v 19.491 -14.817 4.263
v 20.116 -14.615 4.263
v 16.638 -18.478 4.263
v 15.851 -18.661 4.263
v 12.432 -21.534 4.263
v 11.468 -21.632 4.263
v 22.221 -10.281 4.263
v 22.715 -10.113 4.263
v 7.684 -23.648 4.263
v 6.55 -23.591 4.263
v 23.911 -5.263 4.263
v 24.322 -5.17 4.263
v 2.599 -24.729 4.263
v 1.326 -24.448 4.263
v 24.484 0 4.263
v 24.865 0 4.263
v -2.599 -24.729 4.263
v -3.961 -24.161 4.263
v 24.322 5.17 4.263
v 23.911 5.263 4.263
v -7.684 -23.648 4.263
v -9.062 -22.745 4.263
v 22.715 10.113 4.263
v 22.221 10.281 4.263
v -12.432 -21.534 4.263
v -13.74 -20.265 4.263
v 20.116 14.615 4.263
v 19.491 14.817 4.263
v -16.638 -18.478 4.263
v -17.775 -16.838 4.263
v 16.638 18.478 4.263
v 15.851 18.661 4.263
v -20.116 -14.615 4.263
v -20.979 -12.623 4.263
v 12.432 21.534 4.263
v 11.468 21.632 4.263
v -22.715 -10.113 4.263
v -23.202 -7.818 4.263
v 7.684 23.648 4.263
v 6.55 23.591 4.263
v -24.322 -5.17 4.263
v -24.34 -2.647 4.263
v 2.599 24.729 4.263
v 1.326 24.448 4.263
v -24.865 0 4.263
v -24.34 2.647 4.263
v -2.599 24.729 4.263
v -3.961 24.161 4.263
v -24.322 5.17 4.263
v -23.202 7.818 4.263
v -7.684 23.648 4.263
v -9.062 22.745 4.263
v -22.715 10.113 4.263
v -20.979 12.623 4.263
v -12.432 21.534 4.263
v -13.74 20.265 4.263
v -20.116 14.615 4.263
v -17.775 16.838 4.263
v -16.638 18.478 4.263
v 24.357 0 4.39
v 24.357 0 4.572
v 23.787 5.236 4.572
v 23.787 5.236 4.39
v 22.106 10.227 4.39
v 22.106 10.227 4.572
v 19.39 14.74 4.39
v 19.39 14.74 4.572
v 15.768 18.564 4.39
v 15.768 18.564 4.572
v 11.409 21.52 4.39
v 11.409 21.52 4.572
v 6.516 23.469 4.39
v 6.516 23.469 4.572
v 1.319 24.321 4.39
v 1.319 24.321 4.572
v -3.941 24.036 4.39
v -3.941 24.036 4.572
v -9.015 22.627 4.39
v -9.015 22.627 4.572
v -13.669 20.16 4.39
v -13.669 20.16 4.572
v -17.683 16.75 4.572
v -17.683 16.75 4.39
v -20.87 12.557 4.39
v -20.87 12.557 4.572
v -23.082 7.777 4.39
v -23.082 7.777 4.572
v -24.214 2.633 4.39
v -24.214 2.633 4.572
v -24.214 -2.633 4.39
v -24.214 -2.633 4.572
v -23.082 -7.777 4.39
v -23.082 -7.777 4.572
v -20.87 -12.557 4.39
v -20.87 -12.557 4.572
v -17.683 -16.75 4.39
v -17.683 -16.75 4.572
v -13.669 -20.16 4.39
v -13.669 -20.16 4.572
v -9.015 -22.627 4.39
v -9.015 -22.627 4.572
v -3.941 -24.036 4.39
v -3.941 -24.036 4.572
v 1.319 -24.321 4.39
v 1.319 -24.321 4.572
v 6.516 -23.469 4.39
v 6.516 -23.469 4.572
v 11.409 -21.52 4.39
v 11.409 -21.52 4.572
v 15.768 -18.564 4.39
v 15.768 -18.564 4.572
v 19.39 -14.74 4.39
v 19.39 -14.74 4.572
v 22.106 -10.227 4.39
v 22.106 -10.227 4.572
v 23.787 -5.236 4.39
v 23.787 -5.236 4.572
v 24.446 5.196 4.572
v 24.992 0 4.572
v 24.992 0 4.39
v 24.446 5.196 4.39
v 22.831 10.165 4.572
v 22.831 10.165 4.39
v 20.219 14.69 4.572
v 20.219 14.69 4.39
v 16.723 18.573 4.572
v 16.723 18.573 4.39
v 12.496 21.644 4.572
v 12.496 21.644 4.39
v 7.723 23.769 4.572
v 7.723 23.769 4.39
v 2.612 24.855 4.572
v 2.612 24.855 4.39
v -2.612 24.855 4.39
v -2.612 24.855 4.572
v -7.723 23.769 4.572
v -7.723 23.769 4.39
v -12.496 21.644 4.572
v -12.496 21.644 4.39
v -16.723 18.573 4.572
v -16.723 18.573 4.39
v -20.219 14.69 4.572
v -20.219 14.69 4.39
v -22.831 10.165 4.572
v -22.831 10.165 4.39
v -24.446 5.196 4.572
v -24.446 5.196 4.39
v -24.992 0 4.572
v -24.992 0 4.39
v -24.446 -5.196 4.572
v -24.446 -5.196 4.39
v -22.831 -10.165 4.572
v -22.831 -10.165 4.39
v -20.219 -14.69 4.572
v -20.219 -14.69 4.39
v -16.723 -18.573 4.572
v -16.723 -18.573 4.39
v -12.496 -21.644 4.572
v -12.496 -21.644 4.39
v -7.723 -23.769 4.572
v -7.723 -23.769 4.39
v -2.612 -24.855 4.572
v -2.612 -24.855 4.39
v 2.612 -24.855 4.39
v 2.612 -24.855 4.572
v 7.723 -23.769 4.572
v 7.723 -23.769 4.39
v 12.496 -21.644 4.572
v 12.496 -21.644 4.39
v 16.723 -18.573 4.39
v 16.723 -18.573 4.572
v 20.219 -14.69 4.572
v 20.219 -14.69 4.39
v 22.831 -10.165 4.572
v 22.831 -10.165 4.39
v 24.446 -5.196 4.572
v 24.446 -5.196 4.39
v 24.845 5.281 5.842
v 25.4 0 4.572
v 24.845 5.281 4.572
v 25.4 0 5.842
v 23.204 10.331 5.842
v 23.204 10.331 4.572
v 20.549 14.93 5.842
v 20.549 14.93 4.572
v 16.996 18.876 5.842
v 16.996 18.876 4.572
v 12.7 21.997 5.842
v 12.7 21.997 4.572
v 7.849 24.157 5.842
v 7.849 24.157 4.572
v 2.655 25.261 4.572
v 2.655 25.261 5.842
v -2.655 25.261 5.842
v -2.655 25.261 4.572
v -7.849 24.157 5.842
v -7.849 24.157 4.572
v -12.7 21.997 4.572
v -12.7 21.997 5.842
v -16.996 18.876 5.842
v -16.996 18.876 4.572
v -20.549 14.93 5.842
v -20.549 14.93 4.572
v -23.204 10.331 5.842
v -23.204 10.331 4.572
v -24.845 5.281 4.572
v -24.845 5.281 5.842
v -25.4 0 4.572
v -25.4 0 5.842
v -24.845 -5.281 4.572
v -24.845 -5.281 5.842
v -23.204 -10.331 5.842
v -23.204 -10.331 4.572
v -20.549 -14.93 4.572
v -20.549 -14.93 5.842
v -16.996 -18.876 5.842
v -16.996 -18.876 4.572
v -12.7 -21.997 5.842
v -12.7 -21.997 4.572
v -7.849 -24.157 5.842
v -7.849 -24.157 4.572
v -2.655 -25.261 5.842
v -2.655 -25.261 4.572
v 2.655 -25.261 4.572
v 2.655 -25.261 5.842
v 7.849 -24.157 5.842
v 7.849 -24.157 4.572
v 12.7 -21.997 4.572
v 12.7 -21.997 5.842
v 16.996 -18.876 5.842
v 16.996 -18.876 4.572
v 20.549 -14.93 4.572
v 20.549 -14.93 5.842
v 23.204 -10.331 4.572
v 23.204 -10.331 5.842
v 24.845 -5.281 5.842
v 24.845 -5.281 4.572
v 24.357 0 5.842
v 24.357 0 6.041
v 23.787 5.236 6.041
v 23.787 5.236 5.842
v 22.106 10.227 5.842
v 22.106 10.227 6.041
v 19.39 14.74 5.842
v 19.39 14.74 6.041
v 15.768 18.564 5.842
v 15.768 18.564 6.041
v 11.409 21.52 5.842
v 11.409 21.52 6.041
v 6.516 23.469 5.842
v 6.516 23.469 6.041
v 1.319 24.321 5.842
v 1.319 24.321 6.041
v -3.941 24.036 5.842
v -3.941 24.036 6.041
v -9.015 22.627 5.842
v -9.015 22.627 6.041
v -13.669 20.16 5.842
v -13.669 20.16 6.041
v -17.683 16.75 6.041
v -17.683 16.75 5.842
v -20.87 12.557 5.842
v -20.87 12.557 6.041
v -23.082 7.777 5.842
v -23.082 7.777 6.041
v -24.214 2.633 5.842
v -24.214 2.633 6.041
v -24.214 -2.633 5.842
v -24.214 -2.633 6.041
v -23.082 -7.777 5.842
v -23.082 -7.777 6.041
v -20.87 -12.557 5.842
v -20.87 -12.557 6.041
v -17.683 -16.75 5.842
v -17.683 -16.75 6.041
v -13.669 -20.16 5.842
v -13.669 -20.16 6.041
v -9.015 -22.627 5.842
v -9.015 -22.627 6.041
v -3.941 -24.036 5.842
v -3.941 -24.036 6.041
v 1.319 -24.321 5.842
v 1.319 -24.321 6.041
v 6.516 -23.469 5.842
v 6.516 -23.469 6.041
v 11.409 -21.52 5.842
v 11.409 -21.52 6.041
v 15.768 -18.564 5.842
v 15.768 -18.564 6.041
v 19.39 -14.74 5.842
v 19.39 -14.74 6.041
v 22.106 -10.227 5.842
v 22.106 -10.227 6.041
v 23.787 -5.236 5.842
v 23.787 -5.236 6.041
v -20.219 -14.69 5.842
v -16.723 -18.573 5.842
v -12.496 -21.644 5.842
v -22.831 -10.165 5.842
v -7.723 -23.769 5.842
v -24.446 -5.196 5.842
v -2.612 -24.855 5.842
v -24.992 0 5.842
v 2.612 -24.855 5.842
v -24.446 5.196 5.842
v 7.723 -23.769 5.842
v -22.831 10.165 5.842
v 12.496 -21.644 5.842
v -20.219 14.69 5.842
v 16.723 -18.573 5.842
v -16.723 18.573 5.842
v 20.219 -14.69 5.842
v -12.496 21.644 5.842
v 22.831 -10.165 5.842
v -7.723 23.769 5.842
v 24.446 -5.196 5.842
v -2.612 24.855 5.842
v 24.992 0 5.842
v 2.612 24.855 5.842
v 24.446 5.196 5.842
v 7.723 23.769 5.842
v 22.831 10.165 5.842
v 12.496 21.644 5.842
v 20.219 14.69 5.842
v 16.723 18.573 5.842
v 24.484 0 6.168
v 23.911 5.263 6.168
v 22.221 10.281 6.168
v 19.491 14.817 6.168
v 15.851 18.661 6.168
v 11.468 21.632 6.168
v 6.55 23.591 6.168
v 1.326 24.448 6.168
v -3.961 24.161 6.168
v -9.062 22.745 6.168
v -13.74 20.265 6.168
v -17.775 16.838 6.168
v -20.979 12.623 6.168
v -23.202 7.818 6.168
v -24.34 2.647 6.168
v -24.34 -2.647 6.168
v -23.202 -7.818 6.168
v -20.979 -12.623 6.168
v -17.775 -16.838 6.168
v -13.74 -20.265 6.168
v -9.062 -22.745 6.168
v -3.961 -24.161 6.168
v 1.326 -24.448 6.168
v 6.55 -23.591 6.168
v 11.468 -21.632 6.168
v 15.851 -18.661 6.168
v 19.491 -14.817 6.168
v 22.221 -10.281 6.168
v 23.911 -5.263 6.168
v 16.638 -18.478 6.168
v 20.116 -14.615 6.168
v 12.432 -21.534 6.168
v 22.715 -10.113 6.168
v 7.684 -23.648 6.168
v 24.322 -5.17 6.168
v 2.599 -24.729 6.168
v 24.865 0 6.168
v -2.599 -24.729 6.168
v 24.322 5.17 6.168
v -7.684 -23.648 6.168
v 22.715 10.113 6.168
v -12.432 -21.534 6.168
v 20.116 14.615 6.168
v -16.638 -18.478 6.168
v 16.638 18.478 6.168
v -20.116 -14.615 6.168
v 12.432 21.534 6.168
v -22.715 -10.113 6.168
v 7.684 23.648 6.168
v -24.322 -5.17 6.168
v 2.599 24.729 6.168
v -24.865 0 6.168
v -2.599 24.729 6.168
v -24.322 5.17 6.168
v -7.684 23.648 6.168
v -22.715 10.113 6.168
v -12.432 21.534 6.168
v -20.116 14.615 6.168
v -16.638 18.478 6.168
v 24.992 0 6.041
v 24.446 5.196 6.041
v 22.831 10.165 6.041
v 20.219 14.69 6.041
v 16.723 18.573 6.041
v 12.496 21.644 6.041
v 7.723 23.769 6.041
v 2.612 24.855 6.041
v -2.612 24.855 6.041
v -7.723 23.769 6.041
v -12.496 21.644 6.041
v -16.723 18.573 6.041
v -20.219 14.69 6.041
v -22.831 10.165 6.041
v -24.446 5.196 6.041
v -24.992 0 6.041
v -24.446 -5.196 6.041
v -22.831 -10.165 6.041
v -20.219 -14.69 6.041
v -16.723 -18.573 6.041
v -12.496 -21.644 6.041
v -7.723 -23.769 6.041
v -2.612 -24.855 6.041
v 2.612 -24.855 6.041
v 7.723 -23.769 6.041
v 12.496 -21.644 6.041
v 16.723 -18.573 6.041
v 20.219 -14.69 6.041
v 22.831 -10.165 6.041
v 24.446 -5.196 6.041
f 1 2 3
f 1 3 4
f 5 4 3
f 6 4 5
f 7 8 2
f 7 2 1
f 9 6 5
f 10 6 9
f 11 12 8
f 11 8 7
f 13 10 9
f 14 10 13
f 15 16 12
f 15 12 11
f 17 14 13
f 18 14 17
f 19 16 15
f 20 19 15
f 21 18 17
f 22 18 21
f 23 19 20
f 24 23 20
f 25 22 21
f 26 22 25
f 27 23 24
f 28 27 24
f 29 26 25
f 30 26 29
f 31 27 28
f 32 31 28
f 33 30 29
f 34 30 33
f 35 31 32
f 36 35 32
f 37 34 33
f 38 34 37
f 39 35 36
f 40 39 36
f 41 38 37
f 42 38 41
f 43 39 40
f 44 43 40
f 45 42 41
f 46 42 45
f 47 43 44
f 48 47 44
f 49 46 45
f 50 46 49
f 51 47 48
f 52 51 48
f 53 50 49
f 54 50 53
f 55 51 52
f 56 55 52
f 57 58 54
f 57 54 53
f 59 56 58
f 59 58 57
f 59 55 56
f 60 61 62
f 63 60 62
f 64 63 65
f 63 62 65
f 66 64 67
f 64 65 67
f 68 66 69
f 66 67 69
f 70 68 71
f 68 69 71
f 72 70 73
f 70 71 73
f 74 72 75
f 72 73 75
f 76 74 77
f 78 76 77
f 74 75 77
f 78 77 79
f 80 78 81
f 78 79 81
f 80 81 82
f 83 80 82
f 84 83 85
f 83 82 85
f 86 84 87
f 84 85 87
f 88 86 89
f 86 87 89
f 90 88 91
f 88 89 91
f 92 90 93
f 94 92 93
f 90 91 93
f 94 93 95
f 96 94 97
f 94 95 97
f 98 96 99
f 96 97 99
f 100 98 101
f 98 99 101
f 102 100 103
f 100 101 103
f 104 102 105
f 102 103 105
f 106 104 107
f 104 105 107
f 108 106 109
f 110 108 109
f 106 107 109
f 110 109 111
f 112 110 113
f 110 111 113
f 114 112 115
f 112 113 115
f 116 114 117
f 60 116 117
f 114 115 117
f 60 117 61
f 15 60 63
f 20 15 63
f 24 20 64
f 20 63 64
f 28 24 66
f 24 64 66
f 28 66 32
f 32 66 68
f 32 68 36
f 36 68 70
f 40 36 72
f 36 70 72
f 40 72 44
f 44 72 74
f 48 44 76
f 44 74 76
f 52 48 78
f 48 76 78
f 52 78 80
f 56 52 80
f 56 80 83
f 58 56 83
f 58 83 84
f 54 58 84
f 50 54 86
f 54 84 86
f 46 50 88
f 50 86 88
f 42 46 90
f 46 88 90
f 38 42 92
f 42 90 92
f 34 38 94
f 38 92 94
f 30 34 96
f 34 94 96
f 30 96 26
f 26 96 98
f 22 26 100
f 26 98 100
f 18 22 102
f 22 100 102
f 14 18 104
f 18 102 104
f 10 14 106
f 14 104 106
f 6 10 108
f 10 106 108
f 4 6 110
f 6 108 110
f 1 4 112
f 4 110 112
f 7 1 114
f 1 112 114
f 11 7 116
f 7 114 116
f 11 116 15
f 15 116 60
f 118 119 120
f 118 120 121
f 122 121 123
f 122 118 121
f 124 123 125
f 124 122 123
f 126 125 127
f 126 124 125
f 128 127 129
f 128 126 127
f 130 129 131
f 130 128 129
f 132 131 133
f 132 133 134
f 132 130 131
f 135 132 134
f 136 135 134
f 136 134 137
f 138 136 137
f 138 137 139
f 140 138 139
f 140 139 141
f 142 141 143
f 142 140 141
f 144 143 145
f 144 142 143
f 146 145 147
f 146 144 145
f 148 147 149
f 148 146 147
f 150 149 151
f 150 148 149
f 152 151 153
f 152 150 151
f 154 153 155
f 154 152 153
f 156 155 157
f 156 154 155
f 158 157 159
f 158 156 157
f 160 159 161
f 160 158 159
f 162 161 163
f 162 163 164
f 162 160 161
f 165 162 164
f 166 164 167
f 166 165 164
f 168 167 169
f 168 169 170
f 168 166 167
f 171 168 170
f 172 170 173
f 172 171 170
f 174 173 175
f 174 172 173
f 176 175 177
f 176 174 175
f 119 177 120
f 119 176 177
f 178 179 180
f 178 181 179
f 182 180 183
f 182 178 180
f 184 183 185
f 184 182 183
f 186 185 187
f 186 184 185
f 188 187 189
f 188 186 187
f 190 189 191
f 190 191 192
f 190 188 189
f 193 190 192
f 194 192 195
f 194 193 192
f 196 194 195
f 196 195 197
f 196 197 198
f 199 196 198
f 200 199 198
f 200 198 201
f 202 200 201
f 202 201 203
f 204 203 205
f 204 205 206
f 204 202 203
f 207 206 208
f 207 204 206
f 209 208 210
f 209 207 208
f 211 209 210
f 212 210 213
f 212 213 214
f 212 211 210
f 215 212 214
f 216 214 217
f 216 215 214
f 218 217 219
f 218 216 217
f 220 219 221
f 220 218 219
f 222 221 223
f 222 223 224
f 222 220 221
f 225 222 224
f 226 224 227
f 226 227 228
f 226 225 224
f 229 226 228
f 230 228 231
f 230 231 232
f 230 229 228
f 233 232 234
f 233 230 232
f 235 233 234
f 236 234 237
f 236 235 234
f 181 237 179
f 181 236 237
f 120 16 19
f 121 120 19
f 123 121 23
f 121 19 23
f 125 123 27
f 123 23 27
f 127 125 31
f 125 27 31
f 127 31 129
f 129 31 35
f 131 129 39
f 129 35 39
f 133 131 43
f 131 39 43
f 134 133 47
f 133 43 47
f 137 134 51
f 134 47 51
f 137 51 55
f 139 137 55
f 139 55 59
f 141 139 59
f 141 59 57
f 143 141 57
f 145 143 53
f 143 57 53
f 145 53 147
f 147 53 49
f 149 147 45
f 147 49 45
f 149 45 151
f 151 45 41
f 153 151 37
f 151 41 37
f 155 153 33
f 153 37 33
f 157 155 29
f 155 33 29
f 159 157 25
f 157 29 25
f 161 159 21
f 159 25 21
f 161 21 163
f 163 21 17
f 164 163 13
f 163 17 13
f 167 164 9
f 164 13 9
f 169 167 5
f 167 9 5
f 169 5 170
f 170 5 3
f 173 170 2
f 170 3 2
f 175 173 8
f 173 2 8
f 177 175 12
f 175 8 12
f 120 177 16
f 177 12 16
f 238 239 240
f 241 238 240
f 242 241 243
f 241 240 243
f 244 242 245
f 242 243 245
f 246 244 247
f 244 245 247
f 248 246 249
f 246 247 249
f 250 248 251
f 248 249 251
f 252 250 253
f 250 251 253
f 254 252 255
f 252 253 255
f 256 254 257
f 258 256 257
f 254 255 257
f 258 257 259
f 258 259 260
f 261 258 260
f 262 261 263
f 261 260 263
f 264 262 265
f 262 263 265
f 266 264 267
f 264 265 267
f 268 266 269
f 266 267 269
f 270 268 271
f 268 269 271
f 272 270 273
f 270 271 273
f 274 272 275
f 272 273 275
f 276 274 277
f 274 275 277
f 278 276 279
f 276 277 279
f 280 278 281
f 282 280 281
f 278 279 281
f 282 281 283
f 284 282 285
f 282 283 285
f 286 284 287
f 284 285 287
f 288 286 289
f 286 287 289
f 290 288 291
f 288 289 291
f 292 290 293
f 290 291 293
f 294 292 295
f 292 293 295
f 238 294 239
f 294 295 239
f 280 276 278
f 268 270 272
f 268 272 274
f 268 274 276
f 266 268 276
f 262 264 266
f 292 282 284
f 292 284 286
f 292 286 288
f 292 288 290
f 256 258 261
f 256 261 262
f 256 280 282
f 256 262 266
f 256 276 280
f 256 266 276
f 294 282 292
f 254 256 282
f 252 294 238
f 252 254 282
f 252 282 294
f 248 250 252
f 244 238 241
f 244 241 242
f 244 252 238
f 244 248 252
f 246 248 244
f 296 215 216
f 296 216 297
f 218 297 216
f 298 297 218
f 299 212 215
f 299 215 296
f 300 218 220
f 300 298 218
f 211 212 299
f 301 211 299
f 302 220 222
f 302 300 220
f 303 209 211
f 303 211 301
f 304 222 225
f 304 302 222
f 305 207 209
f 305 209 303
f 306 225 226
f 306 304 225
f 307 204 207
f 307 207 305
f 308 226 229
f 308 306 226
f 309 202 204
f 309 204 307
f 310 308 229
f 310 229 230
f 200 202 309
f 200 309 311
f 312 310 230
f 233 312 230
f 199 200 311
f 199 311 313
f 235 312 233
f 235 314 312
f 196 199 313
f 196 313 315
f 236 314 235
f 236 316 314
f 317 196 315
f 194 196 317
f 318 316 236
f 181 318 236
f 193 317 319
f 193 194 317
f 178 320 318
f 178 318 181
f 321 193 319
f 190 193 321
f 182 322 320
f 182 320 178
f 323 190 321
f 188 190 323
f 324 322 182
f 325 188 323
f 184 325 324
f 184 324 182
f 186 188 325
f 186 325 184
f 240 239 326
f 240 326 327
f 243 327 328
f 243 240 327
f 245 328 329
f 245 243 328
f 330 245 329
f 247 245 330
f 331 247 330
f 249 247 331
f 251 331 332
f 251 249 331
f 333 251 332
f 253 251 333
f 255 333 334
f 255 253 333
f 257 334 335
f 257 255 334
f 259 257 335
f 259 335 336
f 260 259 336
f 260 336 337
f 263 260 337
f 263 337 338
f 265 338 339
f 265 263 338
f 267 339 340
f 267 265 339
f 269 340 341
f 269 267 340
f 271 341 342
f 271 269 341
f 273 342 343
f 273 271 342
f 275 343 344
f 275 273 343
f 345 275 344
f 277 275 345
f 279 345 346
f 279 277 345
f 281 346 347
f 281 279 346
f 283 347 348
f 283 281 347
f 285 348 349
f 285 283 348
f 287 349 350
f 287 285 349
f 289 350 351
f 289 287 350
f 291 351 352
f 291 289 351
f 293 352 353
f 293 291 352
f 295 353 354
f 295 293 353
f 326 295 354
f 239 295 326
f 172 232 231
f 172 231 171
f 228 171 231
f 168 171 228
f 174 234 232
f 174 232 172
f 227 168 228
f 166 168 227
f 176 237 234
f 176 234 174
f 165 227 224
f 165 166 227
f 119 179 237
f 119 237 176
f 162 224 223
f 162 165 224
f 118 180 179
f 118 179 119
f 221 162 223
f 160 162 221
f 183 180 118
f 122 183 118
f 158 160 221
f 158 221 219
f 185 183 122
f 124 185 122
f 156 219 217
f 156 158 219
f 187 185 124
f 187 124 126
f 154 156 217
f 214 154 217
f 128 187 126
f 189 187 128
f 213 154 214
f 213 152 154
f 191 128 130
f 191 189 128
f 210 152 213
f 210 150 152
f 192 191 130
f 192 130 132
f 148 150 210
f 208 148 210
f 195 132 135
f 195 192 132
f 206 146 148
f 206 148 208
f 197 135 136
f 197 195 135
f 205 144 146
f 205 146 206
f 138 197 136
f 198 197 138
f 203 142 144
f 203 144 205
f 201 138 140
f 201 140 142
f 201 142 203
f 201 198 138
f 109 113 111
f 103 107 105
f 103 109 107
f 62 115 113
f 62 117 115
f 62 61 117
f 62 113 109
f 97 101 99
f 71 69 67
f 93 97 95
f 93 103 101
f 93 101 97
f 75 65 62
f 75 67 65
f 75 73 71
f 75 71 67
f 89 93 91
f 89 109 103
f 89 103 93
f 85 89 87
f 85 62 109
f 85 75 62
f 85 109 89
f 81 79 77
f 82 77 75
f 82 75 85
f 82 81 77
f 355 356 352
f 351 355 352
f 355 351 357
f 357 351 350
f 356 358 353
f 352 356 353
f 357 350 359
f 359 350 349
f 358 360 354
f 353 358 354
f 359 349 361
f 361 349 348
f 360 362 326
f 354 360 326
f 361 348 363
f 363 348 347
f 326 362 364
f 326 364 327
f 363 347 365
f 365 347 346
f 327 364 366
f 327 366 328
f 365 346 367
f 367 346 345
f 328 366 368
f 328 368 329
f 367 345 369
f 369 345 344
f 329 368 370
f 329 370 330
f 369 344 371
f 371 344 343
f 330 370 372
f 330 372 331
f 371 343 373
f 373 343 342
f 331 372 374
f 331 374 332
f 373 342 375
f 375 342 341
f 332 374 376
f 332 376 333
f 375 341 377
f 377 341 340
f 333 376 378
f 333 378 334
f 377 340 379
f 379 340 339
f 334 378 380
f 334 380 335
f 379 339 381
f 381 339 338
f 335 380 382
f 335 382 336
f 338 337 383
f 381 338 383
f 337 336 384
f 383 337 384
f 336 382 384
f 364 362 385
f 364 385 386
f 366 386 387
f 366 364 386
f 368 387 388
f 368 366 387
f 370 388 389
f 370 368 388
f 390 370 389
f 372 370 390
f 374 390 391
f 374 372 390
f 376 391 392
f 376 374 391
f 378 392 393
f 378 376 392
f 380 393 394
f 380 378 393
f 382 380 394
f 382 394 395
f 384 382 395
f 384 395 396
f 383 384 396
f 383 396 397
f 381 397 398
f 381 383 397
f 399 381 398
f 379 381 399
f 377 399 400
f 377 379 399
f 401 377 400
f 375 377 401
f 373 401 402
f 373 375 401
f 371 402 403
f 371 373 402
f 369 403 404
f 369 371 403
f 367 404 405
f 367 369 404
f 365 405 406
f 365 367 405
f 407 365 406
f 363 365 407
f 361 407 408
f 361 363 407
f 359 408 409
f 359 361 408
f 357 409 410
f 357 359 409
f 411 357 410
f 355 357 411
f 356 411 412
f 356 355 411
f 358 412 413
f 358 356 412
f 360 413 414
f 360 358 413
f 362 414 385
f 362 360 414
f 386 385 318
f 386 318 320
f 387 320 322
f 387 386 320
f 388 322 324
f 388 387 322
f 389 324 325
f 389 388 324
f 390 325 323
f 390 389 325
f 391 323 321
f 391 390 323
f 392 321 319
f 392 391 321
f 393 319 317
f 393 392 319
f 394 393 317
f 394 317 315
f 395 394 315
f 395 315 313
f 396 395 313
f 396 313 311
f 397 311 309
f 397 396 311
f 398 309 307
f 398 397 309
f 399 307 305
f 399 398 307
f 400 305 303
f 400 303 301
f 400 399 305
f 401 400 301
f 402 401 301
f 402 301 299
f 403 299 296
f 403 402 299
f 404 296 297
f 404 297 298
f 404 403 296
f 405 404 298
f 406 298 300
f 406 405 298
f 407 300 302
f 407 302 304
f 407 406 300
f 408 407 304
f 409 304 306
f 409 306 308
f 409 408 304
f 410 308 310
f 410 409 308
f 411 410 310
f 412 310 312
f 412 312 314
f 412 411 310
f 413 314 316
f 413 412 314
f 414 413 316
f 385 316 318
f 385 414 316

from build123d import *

# Parameters (mm, degrees)
F0_W    = 24.3568923324
F0_H    = 1.27
F0_W_2  = 0.635
F0_W_3  = 0.4081076676
F0_H_2  = 0.3256250771
F0_H_3  = 0.3093749229
F2_SIZE = 0.127
F3_SIZE = 0.127
F4_SIZE = 0.127
F5_SIZE = 0.127


with BuildPart() as f1:
    # F0 (on Front) → F1 (revolve)
    with BuildSketch(Plane.XZ):
        with Locations((12.1784461662, 5.207)):
            Rectangle(F0_W, F0_H)
        with Locations((24.6743923324, 5.207)):
            Rectangle(F0_W_2, F0_H)
        with Locations((25.1959461662, 5.207)):
            Rectangle(F0_W_3, F0_H)
        with Locations((24.6743923324, 6.0048125385)):
            Rectangle(F0_W_2, F0_H_2)
        with Locations((24.6743923324, 4.4173125385)):
            Rectangle(F0_W_2, F0_H_3)
    revolve(axis=Axis((0, 0, 5.207), (0, 0, 1)))

    # F2
    f2_edges = [f1.edges().sort_by_distance(p)[0] for p in [
        (-24.991892, 0, 6.167625),
    ]]
    chamfer(f2_edges, length=F2_SIZE)

    # F3
    f3_edges = [f1.edges().sort_by_distance(p)[0] for p in [
        (-24.356892, 0, 6.167625),
    ]]
    chamfer(f3_edges, length=F3_SIZE)

    # F4
    f4_edges = [f1.edges().sort_by_distance(p)[0] for p in [
        (-24.991892, 0, 4.262625),
    ]]
    chamfer(f4_edges, length=F4_SIZE)

    # F5
    f5_edges = [f1.edges().sort_by_distance(p)[0] for p in [
        (-24.356892, 0, 4.262625),
    ]]
    chamfer(f5_edges, length=F5_SIZE)


solid = f1.part
